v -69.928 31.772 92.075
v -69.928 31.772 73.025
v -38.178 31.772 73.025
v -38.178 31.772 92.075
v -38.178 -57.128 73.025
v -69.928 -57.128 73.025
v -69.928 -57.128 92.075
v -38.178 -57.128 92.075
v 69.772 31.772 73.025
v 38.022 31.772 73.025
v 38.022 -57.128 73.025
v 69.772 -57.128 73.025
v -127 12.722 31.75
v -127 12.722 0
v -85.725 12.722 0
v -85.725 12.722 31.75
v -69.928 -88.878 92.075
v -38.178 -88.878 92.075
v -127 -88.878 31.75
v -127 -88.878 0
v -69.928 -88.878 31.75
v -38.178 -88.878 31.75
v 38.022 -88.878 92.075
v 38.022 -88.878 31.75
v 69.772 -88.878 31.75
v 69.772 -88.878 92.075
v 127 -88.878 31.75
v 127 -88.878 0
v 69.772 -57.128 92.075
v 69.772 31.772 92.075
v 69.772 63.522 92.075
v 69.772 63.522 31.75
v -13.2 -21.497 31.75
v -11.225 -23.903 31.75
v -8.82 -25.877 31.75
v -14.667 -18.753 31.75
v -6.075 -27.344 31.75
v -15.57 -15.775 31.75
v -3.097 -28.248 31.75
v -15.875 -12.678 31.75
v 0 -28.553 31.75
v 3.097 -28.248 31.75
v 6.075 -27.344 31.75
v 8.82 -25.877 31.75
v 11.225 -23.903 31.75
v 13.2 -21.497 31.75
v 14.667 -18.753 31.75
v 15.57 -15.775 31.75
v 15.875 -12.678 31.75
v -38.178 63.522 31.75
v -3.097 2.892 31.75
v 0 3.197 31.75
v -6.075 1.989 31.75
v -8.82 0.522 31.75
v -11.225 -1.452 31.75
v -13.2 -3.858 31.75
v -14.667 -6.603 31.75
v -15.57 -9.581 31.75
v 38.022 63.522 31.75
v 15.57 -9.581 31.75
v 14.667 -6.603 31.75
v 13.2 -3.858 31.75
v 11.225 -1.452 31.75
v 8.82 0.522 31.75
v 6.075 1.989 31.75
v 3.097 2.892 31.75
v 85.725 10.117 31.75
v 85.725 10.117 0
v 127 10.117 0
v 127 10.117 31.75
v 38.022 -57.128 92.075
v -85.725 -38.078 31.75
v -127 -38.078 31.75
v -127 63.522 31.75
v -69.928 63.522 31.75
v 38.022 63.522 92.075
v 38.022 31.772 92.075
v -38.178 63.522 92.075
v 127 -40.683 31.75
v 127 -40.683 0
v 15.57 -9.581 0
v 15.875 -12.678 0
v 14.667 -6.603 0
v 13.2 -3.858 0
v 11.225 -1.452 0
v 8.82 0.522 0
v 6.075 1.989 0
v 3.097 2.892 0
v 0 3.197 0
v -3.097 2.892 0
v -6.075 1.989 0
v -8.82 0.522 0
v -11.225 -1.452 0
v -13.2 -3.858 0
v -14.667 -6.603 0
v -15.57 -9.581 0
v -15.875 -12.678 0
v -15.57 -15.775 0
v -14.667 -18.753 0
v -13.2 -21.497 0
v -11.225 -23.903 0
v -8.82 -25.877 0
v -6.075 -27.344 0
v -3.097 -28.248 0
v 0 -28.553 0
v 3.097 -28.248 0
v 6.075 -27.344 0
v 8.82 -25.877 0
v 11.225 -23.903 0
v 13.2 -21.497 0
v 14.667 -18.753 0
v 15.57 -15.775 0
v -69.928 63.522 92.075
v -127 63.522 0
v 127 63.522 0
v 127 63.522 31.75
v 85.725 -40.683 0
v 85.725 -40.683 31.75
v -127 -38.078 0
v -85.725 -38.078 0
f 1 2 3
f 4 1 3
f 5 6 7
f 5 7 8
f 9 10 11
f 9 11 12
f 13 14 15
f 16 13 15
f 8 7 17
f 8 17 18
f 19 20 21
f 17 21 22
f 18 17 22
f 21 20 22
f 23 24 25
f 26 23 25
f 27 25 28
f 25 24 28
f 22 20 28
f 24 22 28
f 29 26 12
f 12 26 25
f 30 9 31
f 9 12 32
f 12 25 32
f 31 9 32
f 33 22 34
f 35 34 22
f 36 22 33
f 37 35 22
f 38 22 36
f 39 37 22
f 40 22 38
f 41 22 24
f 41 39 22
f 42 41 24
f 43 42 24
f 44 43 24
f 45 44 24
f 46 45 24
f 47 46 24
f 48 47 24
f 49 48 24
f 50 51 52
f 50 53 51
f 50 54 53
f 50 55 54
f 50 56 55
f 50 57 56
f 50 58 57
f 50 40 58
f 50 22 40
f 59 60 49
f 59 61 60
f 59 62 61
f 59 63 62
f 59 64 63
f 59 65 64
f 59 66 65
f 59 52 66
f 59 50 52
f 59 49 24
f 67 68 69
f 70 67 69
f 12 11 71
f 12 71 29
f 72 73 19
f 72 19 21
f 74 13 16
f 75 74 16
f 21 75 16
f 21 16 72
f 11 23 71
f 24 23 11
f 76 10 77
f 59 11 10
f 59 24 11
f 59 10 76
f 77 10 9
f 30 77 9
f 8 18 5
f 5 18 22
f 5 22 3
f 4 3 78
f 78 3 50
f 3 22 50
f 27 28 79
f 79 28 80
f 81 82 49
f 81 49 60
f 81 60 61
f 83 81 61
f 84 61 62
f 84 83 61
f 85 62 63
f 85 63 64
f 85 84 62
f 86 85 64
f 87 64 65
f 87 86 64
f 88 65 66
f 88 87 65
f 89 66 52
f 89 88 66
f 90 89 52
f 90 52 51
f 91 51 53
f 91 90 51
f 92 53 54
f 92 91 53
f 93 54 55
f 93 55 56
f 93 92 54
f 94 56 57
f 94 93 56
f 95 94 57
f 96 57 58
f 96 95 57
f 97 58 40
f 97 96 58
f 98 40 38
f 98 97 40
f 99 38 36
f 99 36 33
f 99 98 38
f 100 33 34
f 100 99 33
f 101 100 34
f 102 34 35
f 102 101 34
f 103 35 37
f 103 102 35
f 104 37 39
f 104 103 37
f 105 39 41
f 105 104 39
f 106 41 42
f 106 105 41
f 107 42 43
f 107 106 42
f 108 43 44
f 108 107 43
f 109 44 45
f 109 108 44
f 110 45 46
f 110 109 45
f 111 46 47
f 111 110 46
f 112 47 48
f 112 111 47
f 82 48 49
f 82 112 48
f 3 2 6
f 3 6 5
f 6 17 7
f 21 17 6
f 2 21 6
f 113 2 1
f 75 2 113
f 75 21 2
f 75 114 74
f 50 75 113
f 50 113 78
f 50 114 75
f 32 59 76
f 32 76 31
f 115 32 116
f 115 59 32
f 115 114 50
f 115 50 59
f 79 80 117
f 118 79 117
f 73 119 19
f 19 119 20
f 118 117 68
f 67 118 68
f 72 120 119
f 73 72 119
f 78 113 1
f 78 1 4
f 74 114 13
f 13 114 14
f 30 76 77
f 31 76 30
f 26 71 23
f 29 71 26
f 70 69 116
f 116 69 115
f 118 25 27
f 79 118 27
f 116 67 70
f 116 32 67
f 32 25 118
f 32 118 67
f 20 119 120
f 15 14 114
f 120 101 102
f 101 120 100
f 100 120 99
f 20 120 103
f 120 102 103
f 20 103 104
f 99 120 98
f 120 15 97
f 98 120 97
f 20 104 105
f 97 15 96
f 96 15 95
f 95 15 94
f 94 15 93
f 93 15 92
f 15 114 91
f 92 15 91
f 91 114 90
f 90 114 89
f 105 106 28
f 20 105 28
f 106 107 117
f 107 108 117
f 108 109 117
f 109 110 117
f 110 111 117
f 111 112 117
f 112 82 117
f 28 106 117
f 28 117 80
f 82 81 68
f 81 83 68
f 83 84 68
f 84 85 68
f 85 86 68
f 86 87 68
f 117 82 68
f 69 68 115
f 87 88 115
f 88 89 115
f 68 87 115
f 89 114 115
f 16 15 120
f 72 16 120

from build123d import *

# Parameters (mm, degrees)
F0_R     = 15.875
F1_DEPTH = 31.75
F0_W     = 31.75
F0_H     = 31.75
F2_DEPTH = 92.075
F0_H_2   = 88.9
F3_DEPTH = 73.025


with BuildPart() as f1:
    # F0 (on Top) → F1 (new body)
    with BuildSketch(Plane.XY):
        Polygon((-69.928209, 63.52225), (-127, 63.52225), (-127, 12.72225), (-85.725, 12.72225), (-85.725, -38.07775), (-127, -38.07775), (-127, -88.87775), (-69.928209, -88.87775), (-69.928209, -57.12775), (-69.928209, 31.77225), align=None)
        Polygon((38.021791, 63.52225), (-38.178209, 63.52225), (-38.178209, 31.77225), (-38.178209, -57.12775), (-38.178209, -88.87775), (38.021791, -88.87775), (38.021791, -57.12775), (38.021791, 31.77225), align=None)
        with Locations((0, -12.67775)):
            Circle(F0_R, mode=Mode.SUBTRACT)
        Polygon((127, 63.52225), (69.771791, 63.52225), (69.771791, 31.77225), (69.771791, -57.12775), (69.771791, -88.87775), (127, -88.87775), (127, -40.683407), (85.725, -40.683407), (85.725, 10.116593), (127, 10.116593), align=None)
    extrude(amount=F1_DEPTH)

    # F0 (on Top) → F2 (join)
    with BuildSketch(Plane.XY):
        with Locations((-54.053209, 47.64725)):
            Rectangle(F0_W, F0_H)
        with Locations((-54.053209, -73.00275)):
            Rectangle(F0_W, F0_H)
        with Locations((53.896791, 47.64725)):
            Rectangle(F0_W, F0_H)
        with Locations((53.896791, -73.00275)):
            Rectangle(F0_W, F0_H)
    extrude(amount=F2_DEPTH)

    # F0 (on Top) → F3 (join)
    with BuildSketch(Plane.XY):
        with Locations((-54.053209, -12.67775)):
            Rectangle(F0_W, F0_H_2)
        with Locations((53.896791, -12.67775)):
            Rectangle(F0_W, F0_H_2)
    extrude(amount=F3_DEPTH)


solid = f1.part
